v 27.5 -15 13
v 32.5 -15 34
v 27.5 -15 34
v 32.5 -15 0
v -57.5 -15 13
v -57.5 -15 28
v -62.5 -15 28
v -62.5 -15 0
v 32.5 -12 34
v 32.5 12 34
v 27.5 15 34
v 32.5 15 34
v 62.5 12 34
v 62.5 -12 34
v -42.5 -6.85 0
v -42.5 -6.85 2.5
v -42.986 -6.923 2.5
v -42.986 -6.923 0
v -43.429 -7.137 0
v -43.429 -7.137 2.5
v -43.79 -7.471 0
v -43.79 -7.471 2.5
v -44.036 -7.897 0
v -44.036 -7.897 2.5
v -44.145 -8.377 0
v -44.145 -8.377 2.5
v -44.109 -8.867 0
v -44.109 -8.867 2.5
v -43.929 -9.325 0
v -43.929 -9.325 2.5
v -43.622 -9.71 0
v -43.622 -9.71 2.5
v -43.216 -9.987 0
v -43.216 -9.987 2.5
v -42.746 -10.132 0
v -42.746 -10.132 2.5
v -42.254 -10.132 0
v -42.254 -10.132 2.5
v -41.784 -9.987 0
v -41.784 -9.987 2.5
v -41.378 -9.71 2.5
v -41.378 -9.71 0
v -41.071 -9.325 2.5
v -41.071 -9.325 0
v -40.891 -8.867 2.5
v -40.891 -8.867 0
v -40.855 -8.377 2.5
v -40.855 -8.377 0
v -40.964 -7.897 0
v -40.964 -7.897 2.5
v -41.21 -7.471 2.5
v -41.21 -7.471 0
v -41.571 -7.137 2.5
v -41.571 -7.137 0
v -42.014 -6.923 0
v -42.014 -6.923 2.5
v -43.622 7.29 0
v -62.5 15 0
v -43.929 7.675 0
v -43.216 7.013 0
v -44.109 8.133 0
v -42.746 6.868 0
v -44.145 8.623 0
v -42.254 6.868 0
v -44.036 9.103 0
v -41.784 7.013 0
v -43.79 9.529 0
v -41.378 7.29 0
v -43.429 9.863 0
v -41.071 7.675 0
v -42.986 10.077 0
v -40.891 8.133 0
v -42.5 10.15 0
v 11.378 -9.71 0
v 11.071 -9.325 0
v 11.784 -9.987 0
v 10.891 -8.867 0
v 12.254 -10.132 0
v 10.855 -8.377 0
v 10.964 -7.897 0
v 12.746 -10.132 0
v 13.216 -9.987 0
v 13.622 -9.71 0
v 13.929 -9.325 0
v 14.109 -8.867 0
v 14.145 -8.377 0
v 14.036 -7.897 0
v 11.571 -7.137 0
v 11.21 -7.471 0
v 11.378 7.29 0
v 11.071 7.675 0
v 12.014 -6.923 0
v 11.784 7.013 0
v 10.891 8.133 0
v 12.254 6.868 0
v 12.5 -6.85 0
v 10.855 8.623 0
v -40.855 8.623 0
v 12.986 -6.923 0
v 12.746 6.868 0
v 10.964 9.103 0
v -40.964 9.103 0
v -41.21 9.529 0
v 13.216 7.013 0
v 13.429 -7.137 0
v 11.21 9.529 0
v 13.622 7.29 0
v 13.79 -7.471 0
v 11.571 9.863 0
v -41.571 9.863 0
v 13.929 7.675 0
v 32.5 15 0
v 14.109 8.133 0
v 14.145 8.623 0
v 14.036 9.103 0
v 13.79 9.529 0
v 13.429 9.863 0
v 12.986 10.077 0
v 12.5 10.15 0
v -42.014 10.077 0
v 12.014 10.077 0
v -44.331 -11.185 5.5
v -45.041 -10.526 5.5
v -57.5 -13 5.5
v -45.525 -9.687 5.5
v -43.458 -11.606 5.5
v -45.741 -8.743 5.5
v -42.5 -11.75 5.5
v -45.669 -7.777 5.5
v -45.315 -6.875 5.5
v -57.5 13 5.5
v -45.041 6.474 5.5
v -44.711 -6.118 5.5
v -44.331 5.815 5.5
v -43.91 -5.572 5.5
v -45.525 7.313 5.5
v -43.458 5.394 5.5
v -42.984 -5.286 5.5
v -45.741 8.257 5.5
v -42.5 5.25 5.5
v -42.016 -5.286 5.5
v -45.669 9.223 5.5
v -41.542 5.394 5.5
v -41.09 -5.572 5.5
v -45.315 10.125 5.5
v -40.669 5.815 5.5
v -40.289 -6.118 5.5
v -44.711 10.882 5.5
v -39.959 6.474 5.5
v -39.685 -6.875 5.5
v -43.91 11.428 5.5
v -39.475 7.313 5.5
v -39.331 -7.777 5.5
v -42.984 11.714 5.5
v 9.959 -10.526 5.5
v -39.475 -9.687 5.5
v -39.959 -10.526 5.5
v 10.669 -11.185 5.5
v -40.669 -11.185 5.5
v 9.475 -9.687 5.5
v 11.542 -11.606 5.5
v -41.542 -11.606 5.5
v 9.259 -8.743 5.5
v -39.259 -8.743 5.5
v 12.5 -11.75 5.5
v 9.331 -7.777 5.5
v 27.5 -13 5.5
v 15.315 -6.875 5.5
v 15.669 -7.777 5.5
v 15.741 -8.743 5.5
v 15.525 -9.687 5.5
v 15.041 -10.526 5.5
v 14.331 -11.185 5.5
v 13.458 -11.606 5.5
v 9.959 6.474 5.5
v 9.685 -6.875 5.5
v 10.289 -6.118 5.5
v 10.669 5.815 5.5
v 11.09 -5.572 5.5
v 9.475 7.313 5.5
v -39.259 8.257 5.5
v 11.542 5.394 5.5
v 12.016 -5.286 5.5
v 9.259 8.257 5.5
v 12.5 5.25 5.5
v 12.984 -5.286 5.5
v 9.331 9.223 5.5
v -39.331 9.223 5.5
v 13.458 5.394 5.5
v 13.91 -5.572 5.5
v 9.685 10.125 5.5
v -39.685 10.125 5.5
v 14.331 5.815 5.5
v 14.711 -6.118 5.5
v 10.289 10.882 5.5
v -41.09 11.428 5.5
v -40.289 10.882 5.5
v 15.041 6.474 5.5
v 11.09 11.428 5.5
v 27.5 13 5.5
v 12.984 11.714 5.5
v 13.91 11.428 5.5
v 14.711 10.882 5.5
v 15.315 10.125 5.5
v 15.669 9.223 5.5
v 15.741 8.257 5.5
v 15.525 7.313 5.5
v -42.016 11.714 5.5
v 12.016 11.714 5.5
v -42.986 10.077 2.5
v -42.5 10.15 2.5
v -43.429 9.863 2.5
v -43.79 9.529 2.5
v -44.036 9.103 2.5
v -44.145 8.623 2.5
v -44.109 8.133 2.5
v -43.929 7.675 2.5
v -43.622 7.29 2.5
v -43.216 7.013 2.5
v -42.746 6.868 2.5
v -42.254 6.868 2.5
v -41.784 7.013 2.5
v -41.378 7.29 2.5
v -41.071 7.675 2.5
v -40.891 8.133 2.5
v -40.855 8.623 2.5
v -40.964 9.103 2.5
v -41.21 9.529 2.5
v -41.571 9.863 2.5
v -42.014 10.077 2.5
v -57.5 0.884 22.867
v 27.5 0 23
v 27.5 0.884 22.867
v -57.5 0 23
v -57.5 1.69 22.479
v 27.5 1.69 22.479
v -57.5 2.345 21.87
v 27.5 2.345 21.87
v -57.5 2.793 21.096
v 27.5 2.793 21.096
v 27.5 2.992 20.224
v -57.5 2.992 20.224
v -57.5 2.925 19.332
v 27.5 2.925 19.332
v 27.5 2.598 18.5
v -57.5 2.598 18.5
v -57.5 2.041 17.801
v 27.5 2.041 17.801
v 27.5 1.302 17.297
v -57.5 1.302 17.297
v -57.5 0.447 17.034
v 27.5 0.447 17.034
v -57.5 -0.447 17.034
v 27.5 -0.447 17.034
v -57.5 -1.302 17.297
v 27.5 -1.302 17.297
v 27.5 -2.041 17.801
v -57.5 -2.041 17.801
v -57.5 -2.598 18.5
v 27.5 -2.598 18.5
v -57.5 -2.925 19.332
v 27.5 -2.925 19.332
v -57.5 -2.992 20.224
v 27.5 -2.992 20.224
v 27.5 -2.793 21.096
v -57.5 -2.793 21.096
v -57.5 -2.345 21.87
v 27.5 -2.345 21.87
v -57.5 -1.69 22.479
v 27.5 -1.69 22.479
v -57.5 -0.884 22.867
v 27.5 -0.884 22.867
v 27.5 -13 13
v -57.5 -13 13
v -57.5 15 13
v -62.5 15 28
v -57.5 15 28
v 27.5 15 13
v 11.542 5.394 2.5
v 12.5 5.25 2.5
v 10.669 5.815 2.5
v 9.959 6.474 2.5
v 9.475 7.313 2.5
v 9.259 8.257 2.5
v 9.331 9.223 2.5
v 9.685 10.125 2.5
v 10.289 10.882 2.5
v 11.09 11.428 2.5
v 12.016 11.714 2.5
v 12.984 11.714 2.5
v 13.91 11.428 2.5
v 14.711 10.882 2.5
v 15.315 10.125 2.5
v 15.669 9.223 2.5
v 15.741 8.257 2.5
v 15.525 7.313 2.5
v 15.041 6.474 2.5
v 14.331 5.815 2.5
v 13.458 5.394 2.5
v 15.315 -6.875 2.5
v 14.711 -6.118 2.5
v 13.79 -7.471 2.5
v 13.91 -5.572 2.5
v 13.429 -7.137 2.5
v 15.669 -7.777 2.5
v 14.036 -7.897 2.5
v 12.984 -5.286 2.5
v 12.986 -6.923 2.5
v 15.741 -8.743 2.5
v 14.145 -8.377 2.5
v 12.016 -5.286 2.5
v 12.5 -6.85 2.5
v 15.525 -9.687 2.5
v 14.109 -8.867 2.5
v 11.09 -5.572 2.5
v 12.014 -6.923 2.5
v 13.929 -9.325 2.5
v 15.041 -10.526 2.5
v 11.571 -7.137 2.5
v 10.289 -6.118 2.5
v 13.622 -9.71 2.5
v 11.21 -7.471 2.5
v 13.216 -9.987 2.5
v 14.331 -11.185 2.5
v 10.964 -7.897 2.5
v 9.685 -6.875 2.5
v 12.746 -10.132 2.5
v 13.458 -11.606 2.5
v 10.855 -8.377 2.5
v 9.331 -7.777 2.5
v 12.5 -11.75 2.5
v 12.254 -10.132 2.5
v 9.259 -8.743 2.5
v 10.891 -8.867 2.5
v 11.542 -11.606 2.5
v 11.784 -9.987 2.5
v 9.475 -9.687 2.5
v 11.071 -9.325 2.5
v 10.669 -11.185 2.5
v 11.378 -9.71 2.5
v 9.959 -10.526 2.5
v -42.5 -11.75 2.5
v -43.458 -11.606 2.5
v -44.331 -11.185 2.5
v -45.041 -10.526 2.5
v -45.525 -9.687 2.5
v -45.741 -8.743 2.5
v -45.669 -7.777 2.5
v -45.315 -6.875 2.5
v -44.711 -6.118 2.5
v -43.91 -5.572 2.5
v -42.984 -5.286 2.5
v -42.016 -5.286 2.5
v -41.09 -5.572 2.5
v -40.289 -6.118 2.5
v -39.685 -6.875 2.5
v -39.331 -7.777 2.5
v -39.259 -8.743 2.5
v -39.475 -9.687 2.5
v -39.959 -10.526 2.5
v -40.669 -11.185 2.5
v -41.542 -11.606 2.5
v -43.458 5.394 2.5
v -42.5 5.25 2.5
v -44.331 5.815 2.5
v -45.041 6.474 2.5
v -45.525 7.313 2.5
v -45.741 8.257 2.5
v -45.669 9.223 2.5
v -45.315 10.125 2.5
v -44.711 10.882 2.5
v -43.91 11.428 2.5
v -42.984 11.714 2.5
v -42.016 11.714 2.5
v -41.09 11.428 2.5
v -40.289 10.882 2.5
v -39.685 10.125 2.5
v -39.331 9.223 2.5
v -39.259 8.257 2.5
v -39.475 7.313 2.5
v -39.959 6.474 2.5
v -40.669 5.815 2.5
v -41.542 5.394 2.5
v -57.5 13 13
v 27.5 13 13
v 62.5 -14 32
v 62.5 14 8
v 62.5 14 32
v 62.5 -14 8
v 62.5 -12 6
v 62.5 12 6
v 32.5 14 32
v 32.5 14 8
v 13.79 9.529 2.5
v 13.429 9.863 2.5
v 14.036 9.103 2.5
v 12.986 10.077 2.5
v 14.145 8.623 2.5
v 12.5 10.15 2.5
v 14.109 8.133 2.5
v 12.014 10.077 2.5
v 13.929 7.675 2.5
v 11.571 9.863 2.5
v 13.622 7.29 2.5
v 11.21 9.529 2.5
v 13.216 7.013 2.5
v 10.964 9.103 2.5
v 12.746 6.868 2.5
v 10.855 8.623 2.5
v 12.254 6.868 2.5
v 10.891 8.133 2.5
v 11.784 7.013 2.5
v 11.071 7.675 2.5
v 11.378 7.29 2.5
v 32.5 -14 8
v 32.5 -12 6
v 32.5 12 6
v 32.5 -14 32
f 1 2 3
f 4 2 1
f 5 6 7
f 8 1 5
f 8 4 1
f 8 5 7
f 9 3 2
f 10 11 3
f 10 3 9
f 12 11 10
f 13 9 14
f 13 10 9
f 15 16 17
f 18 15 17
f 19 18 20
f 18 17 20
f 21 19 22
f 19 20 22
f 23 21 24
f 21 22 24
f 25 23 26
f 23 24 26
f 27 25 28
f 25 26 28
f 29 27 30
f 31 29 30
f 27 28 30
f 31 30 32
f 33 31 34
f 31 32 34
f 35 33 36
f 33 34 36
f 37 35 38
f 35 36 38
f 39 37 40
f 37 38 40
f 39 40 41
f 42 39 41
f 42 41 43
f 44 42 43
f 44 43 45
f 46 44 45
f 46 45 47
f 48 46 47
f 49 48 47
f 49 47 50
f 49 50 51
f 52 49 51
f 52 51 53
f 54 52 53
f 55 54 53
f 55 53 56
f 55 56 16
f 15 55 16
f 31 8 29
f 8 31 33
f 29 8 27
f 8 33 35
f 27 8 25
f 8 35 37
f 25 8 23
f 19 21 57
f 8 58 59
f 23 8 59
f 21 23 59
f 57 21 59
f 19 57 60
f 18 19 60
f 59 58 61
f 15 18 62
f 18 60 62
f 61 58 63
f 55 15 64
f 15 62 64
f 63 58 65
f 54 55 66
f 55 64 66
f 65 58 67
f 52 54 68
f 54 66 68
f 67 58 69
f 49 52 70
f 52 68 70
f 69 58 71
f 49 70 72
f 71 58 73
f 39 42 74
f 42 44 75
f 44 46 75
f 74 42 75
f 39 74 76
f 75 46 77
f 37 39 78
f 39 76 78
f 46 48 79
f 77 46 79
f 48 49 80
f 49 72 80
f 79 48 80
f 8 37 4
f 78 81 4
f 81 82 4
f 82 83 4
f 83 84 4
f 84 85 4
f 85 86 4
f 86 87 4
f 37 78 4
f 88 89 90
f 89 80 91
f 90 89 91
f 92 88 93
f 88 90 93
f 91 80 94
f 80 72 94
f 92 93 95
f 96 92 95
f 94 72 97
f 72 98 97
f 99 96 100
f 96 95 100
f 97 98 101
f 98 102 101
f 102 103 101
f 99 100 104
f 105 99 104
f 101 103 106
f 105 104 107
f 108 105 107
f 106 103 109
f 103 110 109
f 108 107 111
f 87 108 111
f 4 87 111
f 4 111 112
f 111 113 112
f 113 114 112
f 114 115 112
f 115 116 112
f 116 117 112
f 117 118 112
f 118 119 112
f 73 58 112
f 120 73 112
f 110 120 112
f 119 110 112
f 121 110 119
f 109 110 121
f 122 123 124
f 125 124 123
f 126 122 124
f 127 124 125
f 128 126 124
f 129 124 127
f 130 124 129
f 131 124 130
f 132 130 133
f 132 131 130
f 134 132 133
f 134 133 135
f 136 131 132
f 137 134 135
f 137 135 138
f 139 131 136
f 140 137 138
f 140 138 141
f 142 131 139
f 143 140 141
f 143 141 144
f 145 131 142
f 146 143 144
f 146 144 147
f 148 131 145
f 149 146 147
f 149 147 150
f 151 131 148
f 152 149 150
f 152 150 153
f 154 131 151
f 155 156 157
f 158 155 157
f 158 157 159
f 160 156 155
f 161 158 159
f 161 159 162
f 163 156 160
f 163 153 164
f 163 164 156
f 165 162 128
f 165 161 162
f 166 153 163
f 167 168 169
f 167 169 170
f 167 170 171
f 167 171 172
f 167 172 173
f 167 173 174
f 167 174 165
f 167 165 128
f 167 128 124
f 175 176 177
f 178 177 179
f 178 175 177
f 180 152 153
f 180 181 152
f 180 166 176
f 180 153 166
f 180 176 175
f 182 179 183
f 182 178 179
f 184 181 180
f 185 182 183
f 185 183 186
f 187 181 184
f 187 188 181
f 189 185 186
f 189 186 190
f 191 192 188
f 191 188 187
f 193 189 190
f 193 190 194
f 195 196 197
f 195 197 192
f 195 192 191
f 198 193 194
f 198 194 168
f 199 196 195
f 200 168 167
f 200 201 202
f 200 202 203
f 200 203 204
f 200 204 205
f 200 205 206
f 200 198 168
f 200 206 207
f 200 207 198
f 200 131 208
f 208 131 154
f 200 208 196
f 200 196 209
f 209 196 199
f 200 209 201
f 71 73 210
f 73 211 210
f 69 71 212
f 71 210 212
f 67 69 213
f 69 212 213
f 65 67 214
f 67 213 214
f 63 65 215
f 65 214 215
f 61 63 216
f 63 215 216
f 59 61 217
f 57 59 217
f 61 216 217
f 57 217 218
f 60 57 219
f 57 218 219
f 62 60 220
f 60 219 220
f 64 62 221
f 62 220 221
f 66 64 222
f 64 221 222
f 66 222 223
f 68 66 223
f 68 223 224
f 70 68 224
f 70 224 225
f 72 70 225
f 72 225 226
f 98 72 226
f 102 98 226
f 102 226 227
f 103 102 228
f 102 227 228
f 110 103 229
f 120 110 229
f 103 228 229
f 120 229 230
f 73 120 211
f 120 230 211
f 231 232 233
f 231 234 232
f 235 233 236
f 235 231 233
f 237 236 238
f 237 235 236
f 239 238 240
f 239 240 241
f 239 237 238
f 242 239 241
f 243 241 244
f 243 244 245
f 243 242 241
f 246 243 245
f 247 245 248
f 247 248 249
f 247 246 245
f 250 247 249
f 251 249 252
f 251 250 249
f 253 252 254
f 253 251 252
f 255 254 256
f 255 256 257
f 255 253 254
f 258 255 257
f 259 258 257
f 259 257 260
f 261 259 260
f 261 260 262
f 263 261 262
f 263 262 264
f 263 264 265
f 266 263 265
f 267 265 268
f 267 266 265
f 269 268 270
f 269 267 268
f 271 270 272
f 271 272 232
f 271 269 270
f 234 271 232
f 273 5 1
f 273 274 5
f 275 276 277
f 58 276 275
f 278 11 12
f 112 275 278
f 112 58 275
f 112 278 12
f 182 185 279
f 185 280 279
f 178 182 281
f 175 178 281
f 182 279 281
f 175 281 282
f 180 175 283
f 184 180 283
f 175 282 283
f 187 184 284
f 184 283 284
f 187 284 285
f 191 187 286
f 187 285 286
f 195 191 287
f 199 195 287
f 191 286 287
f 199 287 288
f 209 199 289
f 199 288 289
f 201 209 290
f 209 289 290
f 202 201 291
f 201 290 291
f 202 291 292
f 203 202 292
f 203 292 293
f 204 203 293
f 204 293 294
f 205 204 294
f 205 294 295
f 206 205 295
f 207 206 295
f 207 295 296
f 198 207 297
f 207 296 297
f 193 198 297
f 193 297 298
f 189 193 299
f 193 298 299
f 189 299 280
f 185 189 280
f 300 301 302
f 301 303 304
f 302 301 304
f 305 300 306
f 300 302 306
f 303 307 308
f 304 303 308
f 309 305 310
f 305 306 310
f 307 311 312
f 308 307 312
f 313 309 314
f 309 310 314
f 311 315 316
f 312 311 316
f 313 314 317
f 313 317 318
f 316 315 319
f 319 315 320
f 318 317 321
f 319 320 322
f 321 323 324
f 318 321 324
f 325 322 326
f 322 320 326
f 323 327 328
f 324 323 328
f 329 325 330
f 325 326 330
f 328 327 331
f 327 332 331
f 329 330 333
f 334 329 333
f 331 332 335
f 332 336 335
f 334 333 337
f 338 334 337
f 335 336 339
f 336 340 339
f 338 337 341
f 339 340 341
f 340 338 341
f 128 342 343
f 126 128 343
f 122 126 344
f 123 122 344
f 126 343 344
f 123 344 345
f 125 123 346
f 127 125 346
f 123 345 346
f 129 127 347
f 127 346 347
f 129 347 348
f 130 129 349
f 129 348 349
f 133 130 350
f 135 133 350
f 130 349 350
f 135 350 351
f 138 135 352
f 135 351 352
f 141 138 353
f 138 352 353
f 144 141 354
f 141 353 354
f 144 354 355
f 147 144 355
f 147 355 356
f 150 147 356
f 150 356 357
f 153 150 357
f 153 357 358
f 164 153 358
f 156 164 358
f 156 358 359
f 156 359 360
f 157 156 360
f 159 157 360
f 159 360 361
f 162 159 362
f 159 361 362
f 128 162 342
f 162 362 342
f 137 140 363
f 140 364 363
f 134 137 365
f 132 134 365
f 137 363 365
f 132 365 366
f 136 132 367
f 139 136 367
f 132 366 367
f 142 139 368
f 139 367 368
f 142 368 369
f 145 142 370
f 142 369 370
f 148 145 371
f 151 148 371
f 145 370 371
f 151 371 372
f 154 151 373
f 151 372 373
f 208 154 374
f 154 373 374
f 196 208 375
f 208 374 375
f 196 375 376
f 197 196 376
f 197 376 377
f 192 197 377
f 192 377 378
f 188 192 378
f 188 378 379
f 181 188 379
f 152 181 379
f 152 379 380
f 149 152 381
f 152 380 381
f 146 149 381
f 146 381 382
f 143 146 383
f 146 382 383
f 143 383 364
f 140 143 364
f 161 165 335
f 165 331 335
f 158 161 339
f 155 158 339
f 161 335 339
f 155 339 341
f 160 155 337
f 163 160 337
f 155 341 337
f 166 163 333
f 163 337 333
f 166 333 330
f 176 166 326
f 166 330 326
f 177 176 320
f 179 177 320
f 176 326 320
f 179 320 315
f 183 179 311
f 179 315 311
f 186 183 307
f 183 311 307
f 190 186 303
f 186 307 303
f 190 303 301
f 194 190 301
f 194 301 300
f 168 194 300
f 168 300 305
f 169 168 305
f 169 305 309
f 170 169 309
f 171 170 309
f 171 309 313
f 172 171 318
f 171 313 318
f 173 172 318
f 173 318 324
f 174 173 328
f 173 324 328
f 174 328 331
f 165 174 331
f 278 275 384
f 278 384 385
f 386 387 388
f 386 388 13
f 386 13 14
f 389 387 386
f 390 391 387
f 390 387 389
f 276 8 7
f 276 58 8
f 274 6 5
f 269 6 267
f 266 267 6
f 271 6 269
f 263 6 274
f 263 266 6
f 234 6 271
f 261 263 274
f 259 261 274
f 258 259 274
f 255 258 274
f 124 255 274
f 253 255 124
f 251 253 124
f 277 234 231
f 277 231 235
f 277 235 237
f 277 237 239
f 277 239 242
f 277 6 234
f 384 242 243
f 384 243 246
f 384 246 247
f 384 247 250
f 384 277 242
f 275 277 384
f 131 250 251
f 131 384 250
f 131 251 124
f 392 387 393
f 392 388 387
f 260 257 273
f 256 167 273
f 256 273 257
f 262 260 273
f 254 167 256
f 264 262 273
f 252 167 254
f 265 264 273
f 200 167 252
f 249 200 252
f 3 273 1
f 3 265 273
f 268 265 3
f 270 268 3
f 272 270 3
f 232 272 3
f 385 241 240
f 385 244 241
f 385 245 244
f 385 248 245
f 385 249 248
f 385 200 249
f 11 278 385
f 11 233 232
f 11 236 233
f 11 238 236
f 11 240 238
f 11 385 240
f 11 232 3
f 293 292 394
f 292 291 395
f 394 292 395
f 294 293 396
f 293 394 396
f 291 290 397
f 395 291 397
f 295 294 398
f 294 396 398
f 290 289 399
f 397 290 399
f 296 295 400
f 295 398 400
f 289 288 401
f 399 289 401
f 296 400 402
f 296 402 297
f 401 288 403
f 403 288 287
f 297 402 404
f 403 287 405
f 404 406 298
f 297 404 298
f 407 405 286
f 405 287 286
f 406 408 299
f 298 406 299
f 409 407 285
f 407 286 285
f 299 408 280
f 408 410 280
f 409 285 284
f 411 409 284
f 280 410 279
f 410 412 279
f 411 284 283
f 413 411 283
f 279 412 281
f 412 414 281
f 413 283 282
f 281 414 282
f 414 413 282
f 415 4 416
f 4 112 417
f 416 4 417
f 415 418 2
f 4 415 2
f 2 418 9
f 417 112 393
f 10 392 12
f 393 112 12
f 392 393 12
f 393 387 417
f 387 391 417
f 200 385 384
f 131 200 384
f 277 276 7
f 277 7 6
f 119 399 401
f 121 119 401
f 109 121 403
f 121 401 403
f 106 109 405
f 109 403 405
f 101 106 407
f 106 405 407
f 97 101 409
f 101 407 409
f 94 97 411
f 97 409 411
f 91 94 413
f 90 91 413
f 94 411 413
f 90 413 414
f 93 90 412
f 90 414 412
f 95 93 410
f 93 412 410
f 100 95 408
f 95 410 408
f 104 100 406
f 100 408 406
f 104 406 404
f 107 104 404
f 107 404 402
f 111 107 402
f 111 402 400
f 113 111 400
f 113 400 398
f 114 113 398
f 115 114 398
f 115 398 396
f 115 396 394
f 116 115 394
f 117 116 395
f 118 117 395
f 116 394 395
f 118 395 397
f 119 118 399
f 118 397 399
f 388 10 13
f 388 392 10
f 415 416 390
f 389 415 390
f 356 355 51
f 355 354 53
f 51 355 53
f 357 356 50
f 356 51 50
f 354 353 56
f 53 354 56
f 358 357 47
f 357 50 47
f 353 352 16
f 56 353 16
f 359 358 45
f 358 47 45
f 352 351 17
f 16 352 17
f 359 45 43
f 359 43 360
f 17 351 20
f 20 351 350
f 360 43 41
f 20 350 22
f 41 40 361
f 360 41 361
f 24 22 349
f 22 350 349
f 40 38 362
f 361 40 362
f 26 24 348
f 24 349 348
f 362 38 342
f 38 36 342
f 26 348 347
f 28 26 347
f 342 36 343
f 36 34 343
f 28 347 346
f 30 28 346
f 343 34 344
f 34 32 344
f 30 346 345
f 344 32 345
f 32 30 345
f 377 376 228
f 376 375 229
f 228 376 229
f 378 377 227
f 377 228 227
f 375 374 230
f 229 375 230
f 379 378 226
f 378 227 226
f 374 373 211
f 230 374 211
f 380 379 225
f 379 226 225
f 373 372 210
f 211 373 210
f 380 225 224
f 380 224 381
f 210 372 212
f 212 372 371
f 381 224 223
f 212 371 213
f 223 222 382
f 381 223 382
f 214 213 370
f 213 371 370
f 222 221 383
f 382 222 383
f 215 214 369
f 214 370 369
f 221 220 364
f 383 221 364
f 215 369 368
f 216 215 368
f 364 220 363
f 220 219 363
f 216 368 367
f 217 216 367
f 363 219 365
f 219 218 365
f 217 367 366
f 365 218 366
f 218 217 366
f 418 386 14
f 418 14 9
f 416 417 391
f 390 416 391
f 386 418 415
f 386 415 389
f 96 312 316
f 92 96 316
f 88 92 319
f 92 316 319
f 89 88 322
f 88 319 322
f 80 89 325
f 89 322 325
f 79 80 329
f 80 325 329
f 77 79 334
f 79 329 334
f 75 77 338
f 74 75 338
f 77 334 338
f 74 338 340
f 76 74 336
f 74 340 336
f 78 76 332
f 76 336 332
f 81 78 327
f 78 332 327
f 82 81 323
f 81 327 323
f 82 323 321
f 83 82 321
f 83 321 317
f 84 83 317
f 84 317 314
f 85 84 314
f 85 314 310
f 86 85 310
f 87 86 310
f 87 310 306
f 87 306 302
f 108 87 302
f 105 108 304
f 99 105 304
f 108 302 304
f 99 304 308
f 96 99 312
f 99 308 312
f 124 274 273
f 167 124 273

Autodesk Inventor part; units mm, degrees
ref_plane "YZ Plane" through (0, 0, 0) normal (1, 0, 0) x (0, 1, 0)
ref_plane "XZ Plane" through (0, 0, 0) normal (0, 1, 0) x (-1, 0, 0)
ref_plane "XY Plane" through (0, 0, 0) normal (0, 0, 1) x (1, 0, 0)
sketch "スケッチ1" plane through (0, 0, 0) normal (0, 0, 1) x (1, 0, 0)
  line L0 (62.5, -15) -> (-62.5, -15)
  line L1 (-62.5, -15) -> (-62.5, 15)
  line L2 (-62.5, 15) -> (62.5, 15)
  line L3 (62.5, 15) -> (62.5, -15)
  line L4 (62.5, -15) -> (-62.5, 15) construction
  line L5 (-62.5, -15) -> (62.5, 15) construction
  point P0 (0, 0)
  dimension "d0" = 30
  dimension "d1" = 125
extrude "押し出し1" add sketch "スケッチ1" along normal blind 34
sketch "スケッチ2" plane through (-62.5, 15, 0) normal (0, 1, 0) x (1, 0, 0)
  line L0 (125, 0) -> (95, 0)
  line L1 (95, 0) -> (95, -6)
  line L2 (95, -6) -> (125, -6)
  line L3 (125, -6) -> (125, 0)
  point P0 (62.5, 0)
  dimension "d4" = 30
  dimension "d5" = 6
extrude "押し出し2" cut sketch "スケッチ2" against normal blind 34
sketch "スケッチ3" plane through (-62.5, 15, 34) normal (0, 1, 0) x (1, 0, 0)
  line L0 (0, 0) -> (125, 0) projected
  line L1 (90, 0) -> (5, 0)
  line L2 (5, 0) -> (5, 21)
  line L3 (5, 21) -> (90, 21)
  line L4 (90, 21) -> (90, 0)
  line L5 (0, 34) -> (0, 0) projected
  line L6 (95, 28) -> (95, 34) projected
  line L7 (95, 34) -> (0, 34) projected
  point P0 (62.5, 34)
  point P1 (5, 0)
  dimension "d8" = 5
  dimension "d9" = 5
  dimension "d10" = 13
extrude "押し出し3" cut sketch "スケッチ3" against normal blind 34
sketch "スケッチ4" plane through (-62.5, 15, 34) normal (0, 1, 0) x (1, 0, 0)
  line L0 (90, 21) -> (90, 0) projected
  line L1 (125, 0) -> (90, 0) projected
  line L2 (125, 28) -> (125, 0) projected
  line L3 (125, 28) -> (95, 28) projected
  line L4 (95, 28) -> (95, 34) projected
  line L5 (95, 34) -> (0, 34) projected
  line L6 (0, 34) -> (0, 0) projected
  line L7 (5, 0) -> (0, 0) projected
  line L8 (5, 0) -> (5, 21) projected
  line L9 (5, 21) -> (90, 21) projected
  line L10 (5, 0) -> (5, 21) projected
  line L11 (5, 0) -> (0, 0)
  line L12 (0, 0) -> (0, 6)
  line L13 (0, 6) -> (5, 6)
  line L14 (5, 6) -> (5, 0)
  point P0 (62.5, 34)
  point P1 (5, 6)
  dimension "d13" = 28
extrude "押し出し4" cut sketch "スケッチ4" against normal blind 34 contours L8 L7 L6 L13
sketch "スケッチ5" plane through (0, 0, 0) normal (0, 0, -1) x (-1, 0, 0)
  line L0 (-12.5, 8.5) -> (42.5, 8.5)
  line L1 (42.5, 8.5) -> (42.5, -8.5)
  line L2 (42.5, -8.5) -> (-12.5, -8.5)
  line L3 (-12.5, -8.5) -> (-12.5, 8.5)
  line L4 (-32.5, 15) -> (-32.5, -15) projected
  line L5 (62.5, 15) -> (62.5, -15) projected
  point P0 (0, 0)
  dimension "d17" = 20
  dimension "d18" = 55
  dimension "d26" = 17
  dimension "d27" = 8.5
hole "穴1" at (12.5, 8.5, 0) at (12.5, -8.5, 0) at (-42.5, -8.5, 0) at (-42.5, 8.5, 0) direction (0, 0, 1) diameter 3.3 depth 23
sketch "スケッチ6" plane through (-57.5, 15, 13) normal (0, 0, 1) x (1, 0, 0)
  line L0 (85, -2) -> (0, -2)
  line L1 (0, -2) -> (0, -28)
  line L2 (0, -28) -> (85, -28)
  line L3 (85, -28) -> (85, -2)
  line L4 (0, 0) -> (85, 0) projected
  line L5 (85, -30) -> (0, -30) projected
  point P0 (57.5, -15)
  dimension "d28" = 2
  dimension "d29" = 2
extrude "押し出し5" cut sketch "スケッチ6" against normal blind 7.5
sketch "スケッチ7" plane through (-57.5, 15, 5.5) normal (0, 0, 1) x (1, 0, 0)
  circle A0 centre (15, -23.5) radius 1.65 projected
  circle A1 centre (70, -6.5) radius 1.65 projected
  circle A2 centre (70, -23.5) radius 1.65 projected
  circle A3 centre (15, -6.5) radius 1.65 projected
  line L0 (85, -2) -> (85, -28) projected
  line L1 (0, -2) -> (85, -2) projected
  line L2 (0, -28) -> (0, -2) projected
  line L3 (85, -28) -> (0, -28) projected
  point P0 (57.5, -15)
hole "穴2" at (12.5, 8.5, 5.5) at (-42.5, 8.5, 5.5) at (-42.5, -8.5, 5.5) at (12.5, -8.5, 5.5) direction (0, 0, -1) diameter 3.3 depth 23 counterbore diameter 6.5 counterbore depth 3
sketch "スケッチ8" plane through (0, 0, 34) normal (0, 0, 1) x (1, 0, 0)
  line L0 (62.5, 15) -> (32.5, 15) projected
  line L1 (62.5, -15) -> (62.5, 15) projected
  line L2 (32.5, 15) -> (62.5, 15)
  line L3 (62.5, 15) -> (62.5, 14)
  line L4 (62.5, 14) -> (32.5, 14)
  line L5 (32.5, 14) -> (32.5, 15)
  line L6 (62.5, -15) -> (32.5, -15)
  line L7 (32.5, -15) -> (32.5, -14)
  line L8 (32.5, -14) -> (62.5, -14)
  line L9 (62.5, -14) -> (62.5, -15)
  point P0 (0, 0)
  dimension "d39" = 28
  dimension "d40" = 14
extrude "押し出し6" cut sketch "スケッチ8" against normal through all
chamfer "面取り1" distance 2 angle 45 4 edges at (47.5, 14, 34) (47.5, -14, 34) (47.5, 14, 6) (47.5, -14, 6)
sketch "スケッチ9" plane through (-62.5, -15, 0) normal (-1, 0, 0) x (0, 0, 1)
  line L0 (28, 0) -> (28, 30) projected
  line L1 (0, 30) -> (28, 30) projected
  line L2 (0, 30) -> (0, 0) projected
  line L3 (0, 0) -> (28, 0) projected
  circle A0 centre (20, 15) radius 3
  point P0 (0, 15)
  dimension "d46" = 20
  dimension "d47" = 6
extrude "押し出し7" add sketch "スケッチ9" against normal up to surface (90 mm away) contours A0
properties part number "Linear_Unit_A"
